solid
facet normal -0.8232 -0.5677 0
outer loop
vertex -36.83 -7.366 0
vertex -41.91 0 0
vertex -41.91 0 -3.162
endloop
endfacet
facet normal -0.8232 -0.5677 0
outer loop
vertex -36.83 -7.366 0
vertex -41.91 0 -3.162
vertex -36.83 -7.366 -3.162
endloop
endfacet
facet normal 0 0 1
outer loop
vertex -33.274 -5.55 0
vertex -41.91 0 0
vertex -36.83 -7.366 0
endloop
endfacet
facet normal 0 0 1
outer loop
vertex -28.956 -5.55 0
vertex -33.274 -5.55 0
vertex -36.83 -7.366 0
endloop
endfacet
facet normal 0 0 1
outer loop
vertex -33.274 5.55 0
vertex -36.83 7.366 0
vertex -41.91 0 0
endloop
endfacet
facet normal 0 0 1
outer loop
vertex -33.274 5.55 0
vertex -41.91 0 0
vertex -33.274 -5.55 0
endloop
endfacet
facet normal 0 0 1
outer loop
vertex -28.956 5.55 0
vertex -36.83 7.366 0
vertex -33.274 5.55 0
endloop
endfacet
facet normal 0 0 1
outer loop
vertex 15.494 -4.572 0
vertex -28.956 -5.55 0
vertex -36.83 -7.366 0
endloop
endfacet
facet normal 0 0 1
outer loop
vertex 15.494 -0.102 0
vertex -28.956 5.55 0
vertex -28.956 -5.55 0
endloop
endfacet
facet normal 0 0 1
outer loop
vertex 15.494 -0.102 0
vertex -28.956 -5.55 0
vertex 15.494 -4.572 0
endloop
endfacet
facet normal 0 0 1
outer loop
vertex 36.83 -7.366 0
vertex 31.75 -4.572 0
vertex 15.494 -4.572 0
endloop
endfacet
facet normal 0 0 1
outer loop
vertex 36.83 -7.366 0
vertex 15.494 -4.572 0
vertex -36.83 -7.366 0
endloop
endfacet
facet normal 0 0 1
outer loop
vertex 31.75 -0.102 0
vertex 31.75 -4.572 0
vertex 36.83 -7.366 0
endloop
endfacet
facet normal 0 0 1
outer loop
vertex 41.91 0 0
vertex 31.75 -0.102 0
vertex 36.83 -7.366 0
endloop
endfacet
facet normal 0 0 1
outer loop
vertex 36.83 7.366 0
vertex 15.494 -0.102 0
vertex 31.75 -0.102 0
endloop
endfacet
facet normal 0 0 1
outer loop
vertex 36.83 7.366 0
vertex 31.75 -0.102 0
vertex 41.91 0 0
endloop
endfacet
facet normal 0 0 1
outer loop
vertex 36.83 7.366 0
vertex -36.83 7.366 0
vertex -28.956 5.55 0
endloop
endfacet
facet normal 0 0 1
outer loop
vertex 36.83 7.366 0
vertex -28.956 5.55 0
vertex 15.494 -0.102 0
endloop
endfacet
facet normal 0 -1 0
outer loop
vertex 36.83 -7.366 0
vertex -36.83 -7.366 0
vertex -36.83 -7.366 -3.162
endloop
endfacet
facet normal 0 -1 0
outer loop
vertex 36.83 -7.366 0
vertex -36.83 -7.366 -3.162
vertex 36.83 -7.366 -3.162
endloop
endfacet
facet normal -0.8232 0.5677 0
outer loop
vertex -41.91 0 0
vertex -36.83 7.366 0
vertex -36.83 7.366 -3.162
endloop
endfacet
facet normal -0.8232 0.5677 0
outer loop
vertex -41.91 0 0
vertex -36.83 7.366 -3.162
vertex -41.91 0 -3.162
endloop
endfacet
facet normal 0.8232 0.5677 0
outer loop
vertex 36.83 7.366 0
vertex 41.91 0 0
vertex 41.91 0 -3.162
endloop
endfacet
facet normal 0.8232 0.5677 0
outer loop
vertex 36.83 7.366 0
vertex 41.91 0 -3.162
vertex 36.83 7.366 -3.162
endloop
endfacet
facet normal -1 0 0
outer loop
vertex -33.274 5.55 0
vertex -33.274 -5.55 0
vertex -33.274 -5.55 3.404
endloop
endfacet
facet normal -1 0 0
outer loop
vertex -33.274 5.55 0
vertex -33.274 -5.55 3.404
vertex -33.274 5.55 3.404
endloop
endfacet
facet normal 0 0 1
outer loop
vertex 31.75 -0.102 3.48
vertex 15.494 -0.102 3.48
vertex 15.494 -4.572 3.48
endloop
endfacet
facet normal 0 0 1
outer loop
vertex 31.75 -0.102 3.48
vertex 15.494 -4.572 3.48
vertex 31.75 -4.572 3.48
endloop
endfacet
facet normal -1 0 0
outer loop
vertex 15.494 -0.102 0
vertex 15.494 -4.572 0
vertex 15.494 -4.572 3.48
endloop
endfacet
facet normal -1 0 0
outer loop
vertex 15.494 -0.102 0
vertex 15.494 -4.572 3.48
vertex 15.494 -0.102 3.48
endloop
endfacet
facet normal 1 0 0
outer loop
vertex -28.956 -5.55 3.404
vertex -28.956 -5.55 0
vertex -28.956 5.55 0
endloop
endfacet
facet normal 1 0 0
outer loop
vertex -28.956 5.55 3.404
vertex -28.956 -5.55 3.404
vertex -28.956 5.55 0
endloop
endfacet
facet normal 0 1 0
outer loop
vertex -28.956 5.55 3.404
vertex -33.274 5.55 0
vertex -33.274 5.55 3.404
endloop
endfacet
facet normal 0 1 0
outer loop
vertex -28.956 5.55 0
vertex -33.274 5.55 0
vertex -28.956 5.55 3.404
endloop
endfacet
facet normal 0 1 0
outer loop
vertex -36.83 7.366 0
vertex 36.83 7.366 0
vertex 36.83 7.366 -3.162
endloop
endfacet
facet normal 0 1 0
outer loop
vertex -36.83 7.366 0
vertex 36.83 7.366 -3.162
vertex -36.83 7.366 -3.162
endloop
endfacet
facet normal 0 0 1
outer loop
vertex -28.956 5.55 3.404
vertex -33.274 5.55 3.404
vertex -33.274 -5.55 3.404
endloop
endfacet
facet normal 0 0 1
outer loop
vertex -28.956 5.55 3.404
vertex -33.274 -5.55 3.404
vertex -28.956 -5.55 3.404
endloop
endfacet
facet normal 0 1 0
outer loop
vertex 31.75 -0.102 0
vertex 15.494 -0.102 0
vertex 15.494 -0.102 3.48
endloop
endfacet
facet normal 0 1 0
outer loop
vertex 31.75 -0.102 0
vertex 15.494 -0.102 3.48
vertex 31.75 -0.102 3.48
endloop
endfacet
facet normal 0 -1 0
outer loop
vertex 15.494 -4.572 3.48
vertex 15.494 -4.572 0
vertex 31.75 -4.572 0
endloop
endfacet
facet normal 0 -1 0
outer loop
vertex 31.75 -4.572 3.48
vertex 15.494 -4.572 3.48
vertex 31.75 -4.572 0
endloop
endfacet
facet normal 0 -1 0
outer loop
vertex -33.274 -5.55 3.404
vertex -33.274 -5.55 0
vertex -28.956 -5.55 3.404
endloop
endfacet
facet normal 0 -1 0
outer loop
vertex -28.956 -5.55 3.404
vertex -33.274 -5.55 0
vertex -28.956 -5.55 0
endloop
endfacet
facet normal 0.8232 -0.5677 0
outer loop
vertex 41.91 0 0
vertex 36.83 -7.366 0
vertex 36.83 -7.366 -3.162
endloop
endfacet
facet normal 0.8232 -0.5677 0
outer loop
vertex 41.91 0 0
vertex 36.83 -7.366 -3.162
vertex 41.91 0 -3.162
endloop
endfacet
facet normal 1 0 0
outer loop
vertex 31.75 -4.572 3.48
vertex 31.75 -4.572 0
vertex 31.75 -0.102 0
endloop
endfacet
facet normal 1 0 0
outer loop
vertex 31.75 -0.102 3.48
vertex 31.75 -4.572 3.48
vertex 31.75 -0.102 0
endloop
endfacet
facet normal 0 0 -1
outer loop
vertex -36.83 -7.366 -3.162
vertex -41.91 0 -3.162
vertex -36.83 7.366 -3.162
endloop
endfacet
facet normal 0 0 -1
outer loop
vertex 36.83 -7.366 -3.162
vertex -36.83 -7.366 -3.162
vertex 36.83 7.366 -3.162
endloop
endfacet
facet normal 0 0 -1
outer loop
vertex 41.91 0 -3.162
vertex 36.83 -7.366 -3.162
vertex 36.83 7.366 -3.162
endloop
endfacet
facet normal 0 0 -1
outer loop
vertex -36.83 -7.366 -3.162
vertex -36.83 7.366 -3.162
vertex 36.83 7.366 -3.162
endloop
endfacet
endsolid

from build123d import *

# Parameters (mm, degrees)
F0_W     = 4.318
F0_H     = 11.0998
F0_W_2   = 16.256
F0_H_2   = 4.4704
F1_DEPTH = 3.1623
F2_DEPTH = 3.4798
F3_DEPTH = 3.4036


with BuildPart() as f1:
    # F0 (on Top) → F1 (new body)
    with BuildSketch(Plane.XY):
        Polygon((36.83, 7.366), (-36.83, 7.366), (-41.91, 0), (-36.83, -7.366), (36.83, -7.366), (41.91, 0), align=None)
        with Locations((-31.115, 0)):
            Rectangle(F0_W, F0_H, mode=Mode.SUBTRACT)
        with Locations((23.622, -2.3368)):
            Rectangle(F0_W_2, F0_H_2, mode=Mode.SUBTRACT)
        with Locations((-31.115, 0)):
            Rectangle(F0_W, F0_H)
        with Locations((23.622, -2.3368)):
            Rectangle(F0_W_2, F0_H_2)
    extrude(amount=-F1_DEPTH)

    # F0 (on Top) → F2 (join)
    with BuildSketch(Plane.XY):
        with Locations((23.622, -2.3368)):
            Rectangle(F0_W_2, F0_H_2)
    extrude(amount=F2_DEPTH)

    # F0 (on Top) → F3 (join)
    with BuildSketch(Plane.XY):
        with Locations((-31.115, 0)):
            Rectangle(F0_W, F0_H)
    extrude(amount=F3_DEPTH)


solid = f1.part
